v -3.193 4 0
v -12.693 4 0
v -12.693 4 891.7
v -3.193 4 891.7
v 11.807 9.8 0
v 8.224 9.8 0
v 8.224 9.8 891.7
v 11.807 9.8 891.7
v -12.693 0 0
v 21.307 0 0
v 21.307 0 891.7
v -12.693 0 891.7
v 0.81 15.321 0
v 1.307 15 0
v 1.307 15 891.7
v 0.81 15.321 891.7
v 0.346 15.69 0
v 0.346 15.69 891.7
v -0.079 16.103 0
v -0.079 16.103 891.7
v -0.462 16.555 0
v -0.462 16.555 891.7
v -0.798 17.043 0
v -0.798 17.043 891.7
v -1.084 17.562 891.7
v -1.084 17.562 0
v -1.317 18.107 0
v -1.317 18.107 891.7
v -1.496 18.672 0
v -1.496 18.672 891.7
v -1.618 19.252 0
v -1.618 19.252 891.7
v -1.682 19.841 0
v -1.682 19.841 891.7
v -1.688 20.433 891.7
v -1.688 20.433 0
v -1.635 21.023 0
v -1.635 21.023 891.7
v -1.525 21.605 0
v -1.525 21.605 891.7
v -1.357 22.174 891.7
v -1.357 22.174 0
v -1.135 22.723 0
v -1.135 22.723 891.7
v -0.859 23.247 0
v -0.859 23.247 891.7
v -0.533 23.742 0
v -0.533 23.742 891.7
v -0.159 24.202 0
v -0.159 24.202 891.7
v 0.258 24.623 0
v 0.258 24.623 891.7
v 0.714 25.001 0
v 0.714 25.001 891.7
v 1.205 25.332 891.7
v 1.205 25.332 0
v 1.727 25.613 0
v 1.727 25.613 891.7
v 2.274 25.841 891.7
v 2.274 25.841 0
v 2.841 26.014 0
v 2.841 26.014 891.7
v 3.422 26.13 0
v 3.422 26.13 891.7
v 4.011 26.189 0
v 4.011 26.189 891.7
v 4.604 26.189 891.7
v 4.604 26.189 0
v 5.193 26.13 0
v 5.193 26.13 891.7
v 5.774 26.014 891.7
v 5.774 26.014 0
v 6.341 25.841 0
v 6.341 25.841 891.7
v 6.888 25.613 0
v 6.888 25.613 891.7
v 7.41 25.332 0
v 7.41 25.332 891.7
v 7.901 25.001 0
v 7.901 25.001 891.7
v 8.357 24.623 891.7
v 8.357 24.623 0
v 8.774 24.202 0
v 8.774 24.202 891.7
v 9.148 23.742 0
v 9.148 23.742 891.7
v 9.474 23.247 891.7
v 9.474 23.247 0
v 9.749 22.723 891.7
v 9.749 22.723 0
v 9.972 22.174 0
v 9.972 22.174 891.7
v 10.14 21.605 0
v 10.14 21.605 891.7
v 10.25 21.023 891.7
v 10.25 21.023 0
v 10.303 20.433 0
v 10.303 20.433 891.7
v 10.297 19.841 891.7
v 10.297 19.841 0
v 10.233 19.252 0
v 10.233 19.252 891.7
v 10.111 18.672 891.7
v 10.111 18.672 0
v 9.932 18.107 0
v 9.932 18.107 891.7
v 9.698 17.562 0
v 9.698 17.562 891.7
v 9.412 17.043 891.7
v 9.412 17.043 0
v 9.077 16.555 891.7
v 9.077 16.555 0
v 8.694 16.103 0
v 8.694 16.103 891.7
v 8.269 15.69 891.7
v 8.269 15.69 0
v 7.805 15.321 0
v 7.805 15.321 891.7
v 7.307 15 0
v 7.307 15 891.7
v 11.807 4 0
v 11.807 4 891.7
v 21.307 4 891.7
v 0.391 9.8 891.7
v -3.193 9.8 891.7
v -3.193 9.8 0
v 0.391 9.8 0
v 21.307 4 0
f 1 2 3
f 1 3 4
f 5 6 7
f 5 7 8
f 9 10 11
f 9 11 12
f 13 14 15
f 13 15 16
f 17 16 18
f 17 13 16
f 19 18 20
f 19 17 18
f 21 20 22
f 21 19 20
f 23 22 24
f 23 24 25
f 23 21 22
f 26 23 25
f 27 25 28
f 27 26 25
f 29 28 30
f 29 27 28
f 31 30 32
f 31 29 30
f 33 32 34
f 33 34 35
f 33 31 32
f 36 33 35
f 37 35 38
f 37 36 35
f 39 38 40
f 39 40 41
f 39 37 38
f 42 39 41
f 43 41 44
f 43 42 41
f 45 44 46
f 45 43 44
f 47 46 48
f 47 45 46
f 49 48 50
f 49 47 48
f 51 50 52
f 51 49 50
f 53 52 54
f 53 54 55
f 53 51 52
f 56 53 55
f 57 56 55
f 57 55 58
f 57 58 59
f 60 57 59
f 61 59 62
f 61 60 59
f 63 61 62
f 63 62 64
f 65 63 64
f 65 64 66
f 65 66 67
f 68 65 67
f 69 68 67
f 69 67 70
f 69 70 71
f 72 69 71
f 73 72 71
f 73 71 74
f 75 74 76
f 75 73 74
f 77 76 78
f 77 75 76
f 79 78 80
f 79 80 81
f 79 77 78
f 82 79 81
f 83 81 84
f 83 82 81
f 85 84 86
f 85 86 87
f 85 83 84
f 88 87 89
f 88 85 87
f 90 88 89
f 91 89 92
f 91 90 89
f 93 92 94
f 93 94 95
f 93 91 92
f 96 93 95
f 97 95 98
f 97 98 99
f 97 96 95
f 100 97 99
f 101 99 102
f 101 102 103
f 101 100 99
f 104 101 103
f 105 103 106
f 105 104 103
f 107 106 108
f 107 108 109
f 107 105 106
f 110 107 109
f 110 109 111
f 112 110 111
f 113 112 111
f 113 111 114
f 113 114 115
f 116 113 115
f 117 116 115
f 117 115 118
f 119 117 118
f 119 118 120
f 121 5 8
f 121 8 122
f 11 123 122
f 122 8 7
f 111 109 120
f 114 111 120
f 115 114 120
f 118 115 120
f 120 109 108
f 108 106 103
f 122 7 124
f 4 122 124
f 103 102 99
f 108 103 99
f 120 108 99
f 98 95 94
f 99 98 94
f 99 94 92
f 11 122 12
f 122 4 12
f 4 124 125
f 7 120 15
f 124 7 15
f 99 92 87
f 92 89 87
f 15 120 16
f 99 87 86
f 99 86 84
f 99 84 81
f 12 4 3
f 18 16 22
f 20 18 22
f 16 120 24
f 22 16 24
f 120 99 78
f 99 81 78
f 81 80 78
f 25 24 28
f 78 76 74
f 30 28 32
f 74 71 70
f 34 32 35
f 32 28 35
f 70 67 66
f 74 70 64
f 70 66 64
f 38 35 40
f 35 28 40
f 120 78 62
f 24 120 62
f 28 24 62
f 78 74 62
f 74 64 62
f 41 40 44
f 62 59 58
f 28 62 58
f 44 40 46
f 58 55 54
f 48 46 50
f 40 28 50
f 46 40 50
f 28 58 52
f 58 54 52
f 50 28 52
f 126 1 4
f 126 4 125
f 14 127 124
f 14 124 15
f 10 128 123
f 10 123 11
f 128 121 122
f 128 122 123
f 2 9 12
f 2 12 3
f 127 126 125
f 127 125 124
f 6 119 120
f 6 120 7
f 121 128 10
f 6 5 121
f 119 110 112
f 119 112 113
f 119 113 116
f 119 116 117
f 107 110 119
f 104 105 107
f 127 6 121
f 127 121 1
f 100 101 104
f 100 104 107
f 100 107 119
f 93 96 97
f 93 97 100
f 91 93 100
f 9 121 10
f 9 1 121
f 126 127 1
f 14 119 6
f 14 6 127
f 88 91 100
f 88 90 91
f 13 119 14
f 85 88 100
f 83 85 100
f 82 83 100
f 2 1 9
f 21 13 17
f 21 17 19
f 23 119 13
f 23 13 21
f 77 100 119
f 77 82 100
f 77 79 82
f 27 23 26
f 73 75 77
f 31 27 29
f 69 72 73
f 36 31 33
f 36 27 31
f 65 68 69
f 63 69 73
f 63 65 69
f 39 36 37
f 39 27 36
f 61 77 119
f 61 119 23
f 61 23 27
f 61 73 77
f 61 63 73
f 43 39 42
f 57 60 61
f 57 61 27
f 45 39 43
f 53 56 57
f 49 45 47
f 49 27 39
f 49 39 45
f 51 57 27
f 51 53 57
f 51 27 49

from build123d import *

# Parameters (mm, degrees)
BOSS_EXTRUDE1_DEPTH = 891.7


with BuildPart() as part:
    # Sketch1 → Boss-Extrude1 (new body)
    with BuildSketch(Plane.XY):
        with BuildLine():
            Line((21.307457755, 0), (-12.692542245, 0))
            Line((-12.692542245, 0), (-12.692542245, 4))
            Line((-12.692542245, 4), (-3.192542245, 4))
            Line((-3.192542245, 4), (-3.192542245, 9.8))
            Line((-3.192542245, 9.8), (0.390557455, 9.8))
            Line((0.390557455, 9.8), (1.307457755, 15))
            ThreePointArc((1.307457755, 15), (4.307457755, 26.196152423), (7.307457755, 15))
            Line((7.307457755, 15), (8.224358055, 9.8))
            Line((8.224358055, 9.8), (11.807457755, 9.8))
            Line((11.807457755, 9.8), (11.807457755, 4))
            Line((11.807457755, 4), (21.307457755, 4))
            Line((21.307457755, 4), (21.307457755, 0))
        make_face()
    extrude(amount=BOSS_EXTRUDE1_DEPTH)


solid = part.part
